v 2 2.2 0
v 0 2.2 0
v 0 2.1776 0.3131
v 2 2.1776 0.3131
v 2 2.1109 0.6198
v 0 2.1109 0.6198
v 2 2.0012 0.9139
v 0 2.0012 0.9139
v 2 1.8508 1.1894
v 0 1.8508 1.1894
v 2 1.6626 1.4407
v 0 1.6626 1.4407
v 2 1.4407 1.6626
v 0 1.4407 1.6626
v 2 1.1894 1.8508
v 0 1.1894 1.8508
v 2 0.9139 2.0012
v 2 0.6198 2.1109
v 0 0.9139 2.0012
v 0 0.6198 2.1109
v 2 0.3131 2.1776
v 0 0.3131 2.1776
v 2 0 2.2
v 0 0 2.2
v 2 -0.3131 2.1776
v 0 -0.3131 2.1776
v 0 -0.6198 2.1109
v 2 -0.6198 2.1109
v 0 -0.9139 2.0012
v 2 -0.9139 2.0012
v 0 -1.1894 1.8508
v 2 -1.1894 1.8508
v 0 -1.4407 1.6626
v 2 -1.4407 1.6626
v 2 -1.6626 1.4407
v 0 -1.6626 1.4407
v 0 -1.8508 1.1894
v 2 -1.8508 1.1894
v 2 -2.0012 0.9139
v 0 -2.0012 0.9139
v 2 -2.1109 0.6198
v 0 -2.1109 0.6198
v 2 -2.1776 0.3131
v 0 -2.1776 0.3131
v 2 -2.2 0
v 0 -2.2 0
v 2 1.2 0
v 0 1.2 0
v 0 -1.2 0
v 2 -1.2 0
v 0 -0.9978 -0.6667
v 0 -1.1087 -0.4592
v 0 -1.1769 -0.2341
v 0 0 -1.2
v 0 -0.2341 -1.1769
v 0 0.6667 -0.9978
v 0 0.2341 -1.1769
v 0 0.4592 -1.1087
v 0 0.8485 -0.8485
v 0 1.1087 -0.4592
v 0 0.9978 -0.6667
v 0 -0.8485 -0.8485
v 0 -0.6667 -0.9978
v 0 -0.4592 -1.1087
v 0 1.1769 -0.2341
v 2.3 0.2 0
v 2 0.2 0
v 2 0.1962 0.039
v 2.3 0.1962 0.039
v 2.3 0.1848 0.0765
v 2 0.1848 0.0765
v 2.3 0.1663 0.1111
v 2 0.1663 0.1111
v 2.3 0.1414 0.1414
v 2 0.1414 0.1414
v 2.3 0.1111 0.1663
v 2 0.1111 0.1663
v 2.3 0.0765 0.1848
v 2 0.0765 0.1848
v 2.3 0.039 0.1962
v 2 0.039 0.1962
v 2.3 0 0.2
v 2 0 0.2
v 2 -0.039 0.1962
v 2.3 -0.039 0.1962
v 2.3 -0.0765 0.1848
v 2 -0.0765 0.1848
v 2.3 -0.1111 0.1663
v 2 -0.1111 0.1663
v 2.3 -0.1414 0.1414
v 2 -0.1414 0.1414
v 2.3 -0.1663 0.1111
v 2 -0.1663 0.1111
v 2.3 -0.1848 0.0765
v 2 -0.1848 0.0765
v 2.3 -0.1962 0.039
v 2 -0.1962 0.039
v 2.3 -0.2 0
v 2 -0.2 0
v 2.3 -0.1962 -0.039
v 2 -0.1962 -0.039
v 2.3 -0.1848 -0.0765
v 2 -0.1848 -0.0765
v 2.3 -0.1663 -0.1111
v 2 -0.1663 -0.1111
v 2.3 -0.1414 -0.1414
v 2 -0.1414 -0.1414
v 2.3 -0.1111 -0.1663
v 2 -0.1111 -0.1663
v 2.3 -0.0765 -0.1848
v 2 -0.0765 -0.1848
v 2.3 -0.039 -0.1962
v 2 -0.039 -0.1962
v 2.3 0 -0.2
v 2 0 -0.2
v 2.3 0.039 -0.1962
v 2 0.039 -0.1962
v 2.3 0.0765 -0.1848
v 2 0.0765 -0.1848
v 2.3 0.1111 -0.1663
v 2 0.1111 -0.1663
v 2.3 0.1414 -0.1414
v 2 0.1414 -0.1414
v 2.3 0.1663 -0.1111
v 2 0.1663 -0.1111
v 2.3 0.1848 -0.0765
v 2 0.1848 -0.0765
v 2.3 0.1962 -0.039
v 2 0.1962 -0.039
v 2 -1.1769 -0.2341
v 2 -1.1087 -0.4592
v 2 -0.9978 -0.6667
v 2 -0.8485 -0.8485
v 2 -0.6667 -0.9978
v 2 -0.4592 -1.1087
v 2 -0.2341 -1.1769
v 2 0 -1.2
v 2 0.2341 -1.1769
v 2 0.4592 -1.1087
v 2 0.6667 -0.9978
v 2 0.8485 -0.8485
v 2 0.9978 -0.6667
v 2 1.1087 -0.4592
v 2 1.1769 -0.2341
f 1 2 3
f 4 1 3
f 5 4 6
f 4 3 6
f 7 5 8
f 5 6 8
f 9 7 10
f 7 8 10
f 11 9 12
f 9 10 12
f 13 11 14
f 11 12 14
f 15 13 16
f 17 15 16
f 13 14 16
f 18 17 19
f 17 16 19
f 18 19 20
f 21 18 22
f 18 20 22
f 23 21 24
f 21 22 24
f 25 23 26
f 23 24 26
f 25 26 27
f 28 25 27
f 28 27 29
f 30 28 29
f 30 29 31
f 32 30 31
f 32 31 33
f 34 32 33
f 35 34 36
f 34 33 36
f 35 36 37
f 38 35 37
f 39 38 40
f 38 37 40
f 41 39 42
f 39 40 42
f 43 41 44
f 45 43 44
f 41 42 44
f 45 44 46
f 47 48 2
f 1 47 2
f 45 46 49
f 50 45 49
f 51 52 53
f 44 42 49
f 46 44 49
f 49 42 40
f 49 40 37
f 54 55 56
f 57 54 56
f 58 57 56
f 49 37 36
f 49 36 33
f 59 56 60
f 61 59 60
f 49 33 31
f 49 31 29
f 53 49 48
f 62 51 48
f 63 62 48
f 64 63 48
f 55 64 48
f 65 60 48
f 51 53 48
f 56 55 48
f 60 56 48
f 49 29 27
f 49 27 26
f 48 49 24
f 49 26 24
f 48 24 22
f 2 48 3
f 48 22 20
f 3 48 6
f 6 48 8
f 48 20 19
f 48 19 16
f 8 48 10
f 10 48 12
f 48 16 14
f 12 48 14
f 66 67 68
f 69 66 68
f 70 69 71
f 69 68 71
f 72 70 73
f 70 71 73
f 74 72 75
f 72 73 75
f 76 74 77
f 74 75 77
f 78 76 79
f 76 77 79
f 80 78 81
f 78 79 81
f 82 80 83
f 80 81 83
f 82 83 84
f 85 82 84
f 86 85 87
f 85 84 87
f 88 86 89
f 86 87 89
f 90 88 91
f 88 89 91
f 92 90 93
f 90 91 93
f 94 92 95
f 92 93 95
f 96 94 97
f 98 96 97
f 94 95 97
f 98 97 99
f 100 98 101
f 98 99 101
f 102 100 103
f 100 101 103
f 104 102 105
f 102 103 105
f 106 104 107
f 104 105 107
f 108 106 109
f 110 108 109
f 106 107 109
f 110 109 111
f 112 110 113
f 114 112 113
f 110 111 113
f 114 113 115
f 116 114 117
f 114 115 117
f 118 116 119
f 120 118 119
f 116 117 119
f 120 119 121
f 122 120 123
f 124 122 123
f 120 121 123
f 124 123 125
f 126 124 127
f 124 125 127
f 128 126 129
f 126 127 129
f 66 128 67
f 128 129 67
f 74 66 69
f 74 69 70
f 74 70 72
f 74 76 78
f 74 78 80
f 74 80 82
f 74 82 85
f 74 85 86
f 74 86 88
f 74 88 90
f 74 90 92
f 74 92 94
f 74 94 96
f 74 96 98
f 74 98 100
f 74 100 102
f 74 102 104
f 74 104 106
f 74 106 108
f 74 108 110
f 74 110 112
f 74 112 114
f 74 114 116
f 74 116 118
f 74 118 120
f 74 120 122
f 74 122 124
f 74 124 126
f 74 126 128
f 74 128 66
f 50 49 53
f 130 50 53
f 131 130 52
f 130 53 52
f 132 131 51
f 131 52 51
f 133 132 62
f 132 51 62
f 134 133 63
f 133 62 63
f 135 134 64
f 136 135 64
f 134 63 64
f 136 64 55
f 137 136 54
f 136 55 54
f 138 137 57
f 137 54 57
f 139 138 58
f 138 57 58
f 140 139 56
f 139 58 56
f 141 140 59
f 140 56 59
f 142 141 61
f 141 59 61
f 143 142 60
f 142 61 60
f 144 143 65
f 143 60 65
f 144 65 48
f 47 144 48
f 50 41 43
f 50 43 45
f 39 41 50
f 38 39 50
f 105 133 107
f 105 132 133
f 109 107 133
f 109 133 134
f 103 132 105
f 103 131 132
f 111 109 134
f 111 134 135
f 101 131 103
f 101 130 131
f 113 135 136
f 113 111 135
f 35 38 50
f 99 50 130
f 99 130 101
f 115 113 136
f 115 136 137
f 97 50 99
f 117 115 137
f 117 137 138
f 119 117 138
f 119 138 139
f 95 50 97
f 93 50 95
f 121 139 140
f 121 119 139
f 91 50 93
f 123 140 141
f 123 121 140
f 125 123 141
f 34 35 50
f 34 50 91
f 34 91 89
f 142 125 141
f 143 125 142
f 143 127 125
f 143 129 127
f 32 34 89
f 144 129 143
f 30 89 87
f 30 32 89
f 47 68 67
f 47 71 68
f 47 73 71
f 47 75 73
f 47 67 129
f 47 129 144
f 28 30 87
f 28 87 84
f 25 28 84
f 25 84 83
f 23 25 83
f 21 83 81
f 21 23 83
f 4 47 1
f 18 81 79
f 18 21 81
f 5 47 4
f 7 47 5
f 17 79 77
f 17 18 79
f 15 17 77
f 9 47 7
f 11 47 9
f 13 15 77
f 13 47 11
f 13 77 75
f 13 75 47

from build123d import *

# Parameters (mm, degrees)
F1_DEPTH = 2
F2_R     = 0.2
F3_DEPTH = 0.3


with BuildPart() as f1:
    # F0 (on Right) → F1 (new body)
    with BuildSketch(Plane.YZ):
        with BuildLine():
            ThreePointArc((2.2, 0), (0, 2.2), (-2.2, 0))
            Line((-2.2, 0), (-1.2, 0))
            ThreePointArc((-1.2, 0), (0, -1.2), (1.2, 0))
            Line((1.2, 0), (2.2, 0))
        make_face()
    extrude(amount=F1_DEPTH)

    # F2 (on face) → F3 (join)
    with BuildSketch(Plane.YZ.offset(2)):
        Circle(F2_R)
    extrude(amount=F3_DEPTH)


solid = f1.part
